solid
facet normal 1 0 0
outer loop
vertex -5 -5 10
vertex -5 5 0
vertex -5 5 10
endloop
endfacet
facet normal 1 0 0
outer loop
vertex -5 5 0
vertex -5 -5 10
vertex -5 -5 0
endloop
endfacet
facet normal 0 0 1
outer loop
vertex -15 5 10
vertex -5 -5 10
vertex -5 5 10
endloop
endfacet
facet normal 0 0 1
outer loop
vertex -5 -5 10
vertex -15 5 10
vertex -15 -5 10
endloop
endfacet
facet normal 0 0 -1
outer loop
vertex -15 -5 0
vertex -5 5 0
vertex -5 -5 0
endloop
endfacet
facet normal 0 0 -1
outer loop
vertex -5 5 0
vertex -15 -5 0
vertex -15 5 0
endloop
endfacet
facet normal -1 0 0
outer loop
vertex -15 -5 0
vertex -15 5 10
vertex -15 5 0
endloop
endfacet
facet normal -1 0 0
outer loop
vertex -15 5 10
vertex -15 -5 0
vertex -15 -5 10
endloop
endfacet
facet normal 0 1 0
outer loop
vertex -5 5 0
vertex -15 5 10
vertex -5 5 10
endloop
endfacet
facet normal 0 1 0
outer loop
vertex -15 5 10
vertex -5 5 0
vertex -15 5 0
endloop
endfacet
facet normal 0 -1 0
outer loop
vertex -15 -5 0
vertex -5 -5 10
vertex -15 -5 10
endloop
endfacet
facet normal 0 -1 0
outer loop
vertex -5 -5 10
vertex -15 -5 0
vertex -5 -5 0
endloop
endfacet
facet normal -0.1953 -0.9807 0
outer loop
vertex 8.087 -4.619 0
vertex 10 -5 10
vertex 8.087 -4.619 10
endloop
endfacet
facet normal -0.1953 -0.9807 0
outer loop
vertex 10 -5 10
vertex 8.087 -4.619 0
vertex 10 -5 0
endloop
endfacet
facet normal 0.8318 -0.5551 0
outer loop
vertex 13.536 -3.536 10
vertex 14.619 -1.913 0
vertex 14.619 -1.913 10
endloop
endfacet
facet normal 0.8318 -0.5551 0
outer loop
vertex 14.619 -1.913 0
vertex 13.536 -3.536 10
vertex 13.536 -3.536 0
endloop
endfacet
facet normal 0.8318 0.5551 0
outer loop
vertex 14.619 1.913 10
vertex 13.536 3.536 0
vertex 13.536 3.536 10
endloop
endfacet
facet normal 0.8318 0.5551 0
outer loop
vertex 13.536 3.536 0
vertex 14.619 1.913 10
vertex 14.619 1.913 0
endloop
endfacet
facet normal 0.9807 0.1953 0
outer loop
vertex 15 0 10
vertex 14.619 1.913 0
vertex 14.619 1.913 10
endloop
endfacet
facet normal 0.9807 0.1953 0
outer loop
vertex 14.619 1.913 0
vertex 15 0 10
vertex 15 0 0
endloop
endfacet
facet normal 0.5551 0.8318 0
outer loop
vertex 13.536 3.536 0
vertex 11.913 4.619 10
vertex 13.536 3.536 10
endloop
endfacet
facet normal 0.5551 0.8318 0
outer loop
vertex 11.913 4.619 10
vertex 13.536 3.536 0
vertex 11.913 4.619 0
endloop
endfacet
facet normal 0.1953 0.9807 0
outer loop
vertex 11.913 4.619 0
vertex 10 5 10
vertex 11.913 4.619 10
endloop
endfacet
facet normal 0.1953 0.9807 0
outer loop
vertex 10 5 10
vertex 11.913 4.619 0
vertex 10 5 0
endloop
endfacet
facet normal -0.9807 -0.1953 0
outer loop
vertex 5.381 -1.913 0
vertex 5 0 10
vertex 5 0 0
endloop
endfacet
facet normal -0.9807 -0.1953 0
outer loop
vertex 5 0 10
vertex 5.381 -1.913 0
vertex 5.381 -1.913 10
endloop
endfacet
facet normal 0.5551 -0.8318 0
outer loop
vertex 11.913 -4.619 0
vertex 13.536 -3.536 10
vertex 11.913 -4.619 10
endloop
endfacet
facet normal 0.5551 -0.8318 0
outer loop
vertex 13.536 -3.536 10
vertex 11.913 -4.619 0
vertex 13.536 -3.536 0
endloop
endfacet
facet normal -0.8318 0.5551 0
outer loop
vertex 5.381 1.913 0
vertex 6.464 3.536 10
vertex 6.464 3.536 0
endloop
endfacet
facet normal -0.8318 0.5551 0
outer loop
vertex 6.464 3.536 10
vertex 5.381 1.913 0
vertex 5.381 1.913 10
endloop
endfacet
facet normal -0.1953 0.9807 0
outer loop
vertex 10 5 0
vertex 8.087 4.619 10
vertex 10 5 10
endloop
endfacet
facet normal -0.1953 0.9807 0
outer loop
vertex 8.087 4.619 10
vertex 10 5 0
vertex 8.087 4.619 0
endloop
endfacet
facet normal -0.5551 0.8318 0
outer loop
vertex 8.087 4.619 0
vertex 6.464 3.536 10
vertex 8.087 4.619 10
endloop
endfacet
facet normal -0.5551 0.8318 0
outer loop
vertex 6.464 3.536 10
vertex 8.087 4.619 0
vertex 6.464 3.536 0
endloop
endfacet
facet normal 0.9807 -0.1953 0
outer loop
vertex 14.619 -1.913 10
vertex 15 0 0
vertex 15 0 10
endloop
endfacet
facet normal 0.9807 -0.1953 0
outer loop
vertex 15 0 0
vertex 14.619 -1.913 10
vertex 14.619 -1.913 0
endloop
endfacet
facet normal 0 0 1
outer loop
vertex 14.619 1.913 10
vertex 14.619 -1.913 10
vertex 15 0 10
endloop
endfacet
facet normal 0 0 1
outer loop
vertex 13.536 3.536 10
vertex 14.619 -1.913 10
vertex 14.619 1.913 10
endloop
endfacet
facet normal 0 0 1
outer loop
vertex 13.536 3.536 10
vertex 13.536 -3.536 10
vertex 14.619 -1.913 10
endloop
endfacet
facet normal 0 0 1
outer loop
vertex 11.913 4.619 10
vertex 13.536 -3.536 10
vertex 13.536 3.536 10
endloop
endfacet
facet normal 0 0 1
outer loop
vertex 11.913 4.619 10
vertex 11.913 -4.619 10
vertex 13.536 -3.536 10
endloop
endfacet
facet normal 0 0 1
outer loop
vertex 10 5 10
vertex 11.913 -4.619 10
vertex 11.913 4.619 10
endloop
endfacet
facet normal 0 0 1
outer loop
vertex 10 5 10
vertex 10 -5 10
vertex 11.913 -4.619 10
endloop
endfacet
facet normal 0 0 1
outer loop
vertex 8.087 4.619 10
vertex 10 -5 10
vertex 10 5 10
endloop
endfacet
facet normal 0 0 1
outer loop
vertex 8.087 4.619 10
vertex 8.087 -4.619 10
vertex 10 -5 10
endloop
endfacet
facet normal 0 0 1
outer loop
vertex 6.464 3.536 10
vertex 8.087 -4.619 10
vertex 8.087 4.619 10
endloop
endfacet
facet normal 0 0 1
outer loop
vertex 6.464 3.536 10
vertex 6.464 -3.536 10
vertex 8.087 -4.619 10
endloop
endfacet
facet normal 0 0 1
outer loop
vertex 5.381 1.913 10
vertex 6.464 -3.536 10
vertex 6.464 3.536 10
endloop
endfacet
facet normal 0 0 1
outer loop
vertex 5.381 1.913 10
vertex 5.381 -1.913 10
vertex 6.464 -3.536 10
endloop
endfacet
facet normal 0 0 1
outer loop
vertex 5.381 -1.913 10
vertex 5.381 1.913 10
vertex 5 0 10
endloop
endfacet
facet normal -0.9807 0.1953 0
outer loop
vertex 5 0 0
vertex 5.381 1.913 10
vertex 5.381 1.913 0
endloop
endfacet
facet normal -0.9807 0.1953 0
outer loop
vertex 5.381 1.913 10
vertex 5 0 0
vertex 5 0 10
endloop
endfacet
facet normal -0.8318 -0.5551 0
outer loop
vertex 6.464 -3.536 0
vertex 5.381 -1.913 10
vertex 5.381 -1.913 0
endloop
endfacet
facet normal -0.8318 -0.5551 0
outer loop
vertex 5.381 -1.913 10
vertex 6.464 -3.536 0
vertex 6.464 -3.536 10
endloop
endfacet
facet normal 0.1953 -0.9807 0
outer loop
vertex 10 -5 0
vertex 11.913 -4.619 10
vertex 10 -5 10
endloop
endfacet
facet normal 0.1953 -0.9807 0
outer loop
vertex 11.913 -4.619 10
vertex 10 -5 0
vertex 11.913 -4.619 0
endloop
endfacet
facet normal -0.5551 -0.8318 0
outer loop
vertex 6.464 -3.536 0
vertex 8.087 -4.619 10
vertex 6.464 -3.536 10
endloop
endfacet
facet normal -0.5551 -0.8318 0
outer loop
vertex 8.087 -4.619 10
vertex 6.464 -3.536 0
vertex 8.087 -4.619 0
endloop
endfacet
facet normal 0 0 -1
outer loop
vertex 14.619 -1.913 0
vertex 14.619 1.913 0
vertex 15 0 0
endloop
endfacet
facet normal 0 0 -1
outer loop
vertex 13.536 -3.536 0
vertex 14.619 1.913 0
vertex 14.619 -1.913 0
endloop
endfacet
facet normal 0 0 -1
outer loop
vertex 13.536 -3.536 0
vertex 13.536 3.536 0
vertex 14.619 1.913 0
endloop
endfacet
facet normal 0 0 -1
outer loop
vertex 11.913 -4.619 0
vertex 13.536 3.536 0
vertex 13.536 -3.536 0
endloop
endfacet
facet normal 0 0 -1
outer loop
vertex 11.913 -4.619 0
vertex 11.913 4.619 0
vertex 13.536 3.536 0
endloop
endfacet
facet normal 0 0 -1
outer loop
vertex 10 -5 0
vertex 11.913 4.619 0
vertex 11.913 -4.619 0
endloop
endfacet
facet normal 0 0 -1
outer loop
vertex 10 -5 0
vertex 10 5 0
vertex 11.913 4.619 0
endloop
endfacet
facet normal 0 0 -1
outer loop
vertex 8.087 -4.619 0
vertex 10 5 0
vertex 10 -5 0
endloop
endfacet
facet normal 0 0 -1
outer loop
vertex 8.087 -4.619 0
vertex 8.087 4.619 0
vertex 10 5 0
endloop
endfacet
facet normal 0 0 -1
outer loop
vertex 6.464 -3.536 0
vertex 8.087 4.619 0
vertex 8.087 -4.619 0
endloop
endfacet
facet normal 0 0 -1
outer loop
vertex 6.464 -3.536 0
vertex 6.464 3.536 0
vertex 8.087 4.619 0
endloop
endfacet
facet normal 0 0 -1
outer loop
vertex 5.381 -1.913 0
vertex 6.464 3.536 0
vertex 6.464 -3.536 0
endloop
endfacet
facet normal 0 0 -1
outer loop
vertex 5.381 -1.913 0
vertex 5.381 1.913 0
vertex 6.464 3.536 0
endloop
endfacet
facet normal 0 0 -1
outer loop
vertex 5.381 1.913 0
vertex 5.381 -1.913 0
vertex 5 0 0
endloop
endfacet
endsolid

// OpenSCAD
/* [Global] */

// Which one would you like to see?
part = "both"; // [first:Cube Only,second:Cylinder Only,both:Cube and Cylinder]

/* [Cube] */

cube_size = 10; // [1:100]

/* [Cylinder] */

cylinder_size = 10; // [1:100]

/* [Hidden] */

secret = 42;
preview_tab = "";

print_part();

module print_part() {
	if (part == "first") {
		mycube();
	} else if (part == "second") {
		mycylinder();
	} else if (part == "both") {
		both();
	} else {
		both();
	}
}

module both() {
	translate([-cube_size, 0, 0]) mycube();
	translate([cube_size, 0, 0]) mycylinder();
}

module mycube() {
	highlight("Cube") translate([0, 0, cube_size/2]) cube(cube_size, center=true);
}

module mycylinder() {
	highlight("Cylinder") cylinder(r=cube_size/2, h=cylinder_size);
}

module highlight(this_tab) {
  if (preview_tab == this_tab) {
    color("red") child(0);
  } else {
    child(0);
  }
}
